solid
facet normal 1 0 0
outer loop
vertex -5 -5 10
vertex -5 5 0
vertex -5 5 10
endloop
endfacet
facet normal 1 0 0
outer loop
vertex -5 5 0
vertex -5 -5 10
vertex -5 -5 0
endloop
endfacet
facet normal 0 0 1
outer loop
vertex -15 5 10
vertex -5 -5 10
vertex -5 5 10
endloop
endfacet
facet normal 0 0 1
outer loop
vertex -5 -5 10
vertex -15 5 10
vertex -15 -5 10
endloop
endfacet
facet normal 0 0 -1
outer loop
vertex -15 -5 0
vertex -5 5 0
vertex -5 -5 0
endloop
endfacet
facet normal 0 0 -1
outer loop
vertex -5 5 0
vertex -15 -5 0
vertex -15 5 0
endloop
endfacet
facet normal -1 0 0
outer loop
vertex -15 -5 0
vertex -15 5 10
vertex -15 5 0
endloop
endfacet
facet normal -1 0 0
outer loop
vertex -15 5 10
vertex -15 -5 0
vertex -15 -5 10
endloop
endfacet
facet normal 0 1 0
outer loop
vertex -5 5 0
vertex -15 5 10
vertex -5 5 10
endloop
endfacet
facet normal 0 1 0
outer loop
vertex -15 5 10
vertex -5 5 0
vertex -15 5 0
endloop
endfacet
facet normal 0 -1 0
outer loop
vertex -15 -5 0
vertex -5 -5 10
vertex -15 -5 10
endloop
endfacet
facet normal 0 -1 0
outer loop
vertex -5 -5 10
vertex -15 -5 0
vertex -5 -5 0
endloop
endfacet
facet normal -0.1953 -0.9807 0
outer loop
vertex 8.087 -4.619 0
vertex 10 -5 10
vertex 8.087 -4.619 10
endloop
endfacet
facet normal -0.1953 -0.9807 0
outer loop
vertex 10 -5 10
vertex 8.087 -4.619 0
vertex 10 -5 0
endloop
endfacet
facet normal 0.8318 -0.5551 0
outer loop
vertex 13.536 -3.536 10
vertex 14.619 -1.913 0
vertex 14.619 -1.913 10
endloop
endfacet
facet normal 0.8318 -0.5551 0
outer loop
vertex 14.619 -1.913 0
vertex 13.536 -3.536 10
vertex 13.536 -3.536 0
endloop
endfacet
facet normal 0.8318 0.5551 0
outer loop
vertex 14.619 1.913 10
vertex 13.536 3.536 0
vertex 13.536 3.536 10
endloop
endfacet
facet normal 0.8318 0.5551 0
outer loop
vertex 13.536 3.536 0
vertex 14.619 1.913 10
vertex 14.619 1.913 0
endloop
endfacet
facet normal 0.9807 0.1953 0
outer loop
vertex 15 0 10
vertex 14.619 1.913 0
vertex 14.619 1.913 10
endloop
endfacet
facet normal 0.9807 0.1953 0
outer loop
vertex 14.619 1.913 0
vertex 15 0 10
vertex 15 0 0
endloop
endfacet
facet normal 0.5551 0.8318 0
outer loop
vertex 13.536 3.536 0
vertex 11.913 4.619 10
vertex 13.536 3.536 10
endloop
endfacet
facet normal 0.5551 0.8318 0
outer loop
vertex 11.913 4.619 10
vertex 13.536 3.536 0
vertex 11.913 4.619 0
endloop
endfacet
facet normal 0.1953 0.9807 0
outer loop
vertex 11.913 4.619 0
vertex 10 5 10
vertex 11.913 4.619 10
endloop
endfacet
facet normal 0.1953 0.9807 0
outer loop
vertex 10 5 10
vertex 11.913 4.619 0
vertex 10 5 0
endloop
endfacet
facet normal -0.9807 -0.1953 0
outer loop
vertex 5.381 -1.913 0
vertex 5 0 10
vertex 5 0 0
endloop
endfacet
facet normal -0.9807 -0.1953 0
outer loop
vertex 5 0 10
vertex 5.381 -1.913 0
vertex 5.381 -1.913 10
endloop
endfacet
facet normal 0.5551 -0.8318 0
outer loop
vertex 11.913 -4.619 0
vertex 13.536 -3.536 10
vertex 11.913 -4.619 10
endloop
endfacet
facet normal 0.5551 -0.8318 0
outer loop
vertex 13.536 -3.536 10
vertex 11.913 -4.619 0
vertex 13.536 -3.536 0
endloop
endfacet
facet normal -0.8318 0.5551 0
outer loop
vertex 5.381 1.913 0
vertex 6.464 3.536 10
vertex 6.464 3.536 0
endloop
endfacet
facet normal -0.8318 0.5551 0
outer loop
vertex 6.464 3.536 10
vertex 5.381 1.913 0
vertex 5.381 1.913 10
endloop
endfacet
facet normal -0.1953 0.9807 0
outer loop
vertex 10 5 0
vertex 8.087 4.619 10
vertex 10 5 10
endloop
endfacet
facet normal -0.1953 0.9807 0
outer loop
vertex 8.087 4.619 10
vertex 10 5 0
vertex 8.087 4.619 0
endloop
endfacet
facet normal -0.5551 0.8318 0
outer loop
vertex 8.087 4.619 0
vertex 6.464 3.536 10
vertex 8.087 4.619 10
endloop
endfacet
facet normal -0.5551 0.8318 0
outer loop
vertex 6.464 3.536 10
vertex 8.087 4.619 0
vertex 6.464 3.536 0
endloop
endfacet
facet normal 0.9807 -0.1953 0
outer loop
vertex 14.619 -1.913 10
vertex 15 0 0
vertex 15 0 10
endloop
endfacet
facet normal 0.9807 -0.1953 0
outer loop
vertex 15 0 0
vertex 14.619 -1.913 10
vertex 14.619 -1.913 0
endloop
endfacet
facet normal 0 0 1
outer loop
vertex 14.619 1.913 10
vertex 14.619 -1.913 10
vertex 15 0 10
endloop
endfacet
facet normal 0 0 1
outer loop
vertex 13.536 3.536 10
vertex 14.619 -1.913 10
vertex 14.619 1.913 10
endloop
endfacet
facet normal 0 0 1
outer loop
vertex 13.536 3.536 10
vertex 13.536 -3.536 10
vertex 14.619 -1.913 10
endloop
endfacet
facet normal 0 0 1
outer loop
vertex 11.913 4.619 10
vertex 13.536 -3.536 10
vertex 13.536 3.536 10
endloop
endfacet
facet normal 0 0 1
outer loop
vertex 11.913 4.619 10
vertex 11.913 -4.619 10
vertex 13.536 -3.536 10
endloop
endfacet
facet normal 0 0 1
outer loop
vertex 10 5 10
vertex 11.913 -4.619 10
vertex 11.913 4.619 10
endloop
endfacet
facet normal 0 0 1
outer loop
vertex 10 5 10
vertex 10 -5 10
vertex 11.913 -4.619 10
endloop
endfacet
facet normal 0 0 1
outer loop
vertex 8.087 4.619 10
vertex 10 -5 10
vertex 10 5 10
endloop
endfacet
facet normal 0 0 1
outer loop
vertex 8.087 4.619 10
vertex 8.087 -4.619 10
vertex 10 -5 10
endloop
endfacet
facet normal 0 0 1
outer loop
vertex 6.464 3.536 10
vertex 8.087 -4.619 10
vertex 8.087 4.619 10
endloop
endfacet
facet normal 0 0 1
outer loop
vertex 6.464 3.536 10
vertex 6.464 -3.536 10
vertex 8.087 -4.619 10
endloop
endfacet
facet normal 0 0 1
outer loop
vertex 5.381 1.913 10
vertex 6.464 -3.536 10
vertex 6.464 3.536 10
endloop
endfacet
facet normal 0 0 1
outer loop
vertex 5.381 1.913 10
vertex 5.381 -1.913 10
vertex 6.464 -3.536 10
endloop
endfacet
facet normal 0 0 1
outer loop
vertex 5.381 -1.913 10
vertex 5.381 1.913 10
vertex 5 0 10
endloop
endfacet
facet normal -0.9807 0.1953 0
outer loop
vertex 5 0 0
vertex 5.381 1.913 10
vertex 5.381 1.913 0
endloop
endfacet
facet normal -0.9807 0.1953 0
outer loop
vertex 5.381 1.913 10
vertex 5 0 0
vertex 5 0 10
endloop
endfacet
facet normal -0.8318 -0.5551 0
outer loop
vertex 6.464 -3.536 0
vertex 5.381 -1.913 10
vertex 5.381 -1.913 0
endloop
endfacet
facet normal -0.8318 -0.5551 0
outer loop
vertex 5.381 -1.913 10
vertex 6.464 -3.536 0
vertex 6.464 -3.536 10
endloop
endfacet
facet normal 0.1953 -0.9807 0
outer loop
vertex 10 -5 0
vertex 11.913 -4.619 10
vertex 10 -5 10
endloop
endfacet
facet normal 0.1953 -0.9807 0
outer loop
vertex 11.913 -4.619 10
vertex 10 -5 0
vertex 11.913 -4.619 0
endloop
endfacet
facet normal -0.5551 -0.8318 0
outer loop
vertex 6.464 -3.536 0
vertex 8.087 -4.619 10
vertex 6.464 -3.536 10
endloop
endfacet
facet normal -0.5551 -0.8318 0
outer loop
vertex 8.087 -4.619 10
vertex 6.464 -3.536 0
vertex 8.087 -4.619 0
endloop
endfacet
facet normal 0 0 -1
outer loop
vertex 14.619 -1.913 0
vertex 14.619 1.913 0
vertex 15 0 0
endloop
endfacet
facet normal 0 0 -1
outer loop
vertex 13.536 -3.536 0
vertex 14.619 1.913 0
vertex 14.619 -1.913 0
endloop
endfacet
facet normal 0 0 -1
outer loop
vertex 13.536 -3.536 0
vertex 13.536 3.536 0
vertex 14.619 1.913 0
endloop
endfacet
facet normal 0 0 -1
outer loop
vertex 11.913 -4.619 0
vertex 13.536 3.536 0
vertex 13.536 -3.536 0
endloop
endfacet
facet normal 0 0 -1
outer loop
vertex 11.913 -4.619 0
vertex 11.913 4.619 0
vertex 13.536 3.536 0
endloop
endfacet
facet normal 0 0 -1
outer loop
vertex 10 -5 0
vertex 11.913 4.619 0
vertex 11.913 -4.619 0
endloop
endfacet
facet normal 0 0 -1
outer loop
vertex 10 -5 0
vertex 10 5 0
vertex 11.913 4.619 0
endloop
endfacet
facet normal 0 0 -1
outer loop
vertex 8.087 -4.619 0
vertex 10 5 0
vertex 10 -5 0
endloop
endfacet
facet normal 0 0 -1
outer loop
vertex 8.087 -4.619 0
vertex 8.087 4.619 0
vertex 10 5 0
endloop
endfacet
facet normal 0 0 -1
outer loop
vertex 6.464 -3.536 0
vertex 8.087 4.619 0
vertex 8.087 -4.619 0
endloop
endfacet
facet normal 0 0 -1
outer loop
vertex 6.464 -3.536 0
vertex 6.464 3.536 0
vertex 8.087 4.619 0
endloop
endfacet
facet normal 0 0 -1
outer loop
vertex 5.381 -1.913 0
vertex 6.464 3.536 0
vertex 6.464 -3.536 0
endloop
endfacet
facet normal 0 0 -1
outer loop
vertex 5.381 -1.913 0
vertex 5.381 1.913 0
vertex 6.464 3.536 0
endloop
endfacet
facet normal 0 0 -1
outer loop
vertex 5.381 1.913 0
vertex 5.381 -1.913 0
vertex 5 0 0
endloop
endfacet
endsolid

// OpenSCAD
/* [Global] */

// Which one would you like to see?
part = "both"; // [first:Cube Only,second:Cylinder Only,both:Cube and Cylinder]

/* [Cube] */

cube_size = 10; // [1:100]

/* [Cylinder] */

cylinder_size = 10; // [1:100]

/* [Hidden] */

secret = 42;
preview_tab = "";

print_part();

module print_part() {
	if (part == "first") {
		mycube();
	} else if (part == "second") {
		mycylinder();
	} else if (part == "both") {
		both();
	} else {
		both();
	}
}

module both() {
	translate([-cube_size, 0, 0]) mycube();
	translate([cube_size, 0, 0]) mycylinder();
}

module mycube() {
	highlight("Cube") translate([0, 0, cube_size/2]) cube(cube_size, center=true);
}

module mycylinder() {
	highlight("Cylinder") cylinder(r=cube_size/2, h=cylinder_size);
}

module highlight(this_tab) {
  if (preview_tab == this_tab) {
    color("red") child(0);
  } else {
    child(0);
  }
}
